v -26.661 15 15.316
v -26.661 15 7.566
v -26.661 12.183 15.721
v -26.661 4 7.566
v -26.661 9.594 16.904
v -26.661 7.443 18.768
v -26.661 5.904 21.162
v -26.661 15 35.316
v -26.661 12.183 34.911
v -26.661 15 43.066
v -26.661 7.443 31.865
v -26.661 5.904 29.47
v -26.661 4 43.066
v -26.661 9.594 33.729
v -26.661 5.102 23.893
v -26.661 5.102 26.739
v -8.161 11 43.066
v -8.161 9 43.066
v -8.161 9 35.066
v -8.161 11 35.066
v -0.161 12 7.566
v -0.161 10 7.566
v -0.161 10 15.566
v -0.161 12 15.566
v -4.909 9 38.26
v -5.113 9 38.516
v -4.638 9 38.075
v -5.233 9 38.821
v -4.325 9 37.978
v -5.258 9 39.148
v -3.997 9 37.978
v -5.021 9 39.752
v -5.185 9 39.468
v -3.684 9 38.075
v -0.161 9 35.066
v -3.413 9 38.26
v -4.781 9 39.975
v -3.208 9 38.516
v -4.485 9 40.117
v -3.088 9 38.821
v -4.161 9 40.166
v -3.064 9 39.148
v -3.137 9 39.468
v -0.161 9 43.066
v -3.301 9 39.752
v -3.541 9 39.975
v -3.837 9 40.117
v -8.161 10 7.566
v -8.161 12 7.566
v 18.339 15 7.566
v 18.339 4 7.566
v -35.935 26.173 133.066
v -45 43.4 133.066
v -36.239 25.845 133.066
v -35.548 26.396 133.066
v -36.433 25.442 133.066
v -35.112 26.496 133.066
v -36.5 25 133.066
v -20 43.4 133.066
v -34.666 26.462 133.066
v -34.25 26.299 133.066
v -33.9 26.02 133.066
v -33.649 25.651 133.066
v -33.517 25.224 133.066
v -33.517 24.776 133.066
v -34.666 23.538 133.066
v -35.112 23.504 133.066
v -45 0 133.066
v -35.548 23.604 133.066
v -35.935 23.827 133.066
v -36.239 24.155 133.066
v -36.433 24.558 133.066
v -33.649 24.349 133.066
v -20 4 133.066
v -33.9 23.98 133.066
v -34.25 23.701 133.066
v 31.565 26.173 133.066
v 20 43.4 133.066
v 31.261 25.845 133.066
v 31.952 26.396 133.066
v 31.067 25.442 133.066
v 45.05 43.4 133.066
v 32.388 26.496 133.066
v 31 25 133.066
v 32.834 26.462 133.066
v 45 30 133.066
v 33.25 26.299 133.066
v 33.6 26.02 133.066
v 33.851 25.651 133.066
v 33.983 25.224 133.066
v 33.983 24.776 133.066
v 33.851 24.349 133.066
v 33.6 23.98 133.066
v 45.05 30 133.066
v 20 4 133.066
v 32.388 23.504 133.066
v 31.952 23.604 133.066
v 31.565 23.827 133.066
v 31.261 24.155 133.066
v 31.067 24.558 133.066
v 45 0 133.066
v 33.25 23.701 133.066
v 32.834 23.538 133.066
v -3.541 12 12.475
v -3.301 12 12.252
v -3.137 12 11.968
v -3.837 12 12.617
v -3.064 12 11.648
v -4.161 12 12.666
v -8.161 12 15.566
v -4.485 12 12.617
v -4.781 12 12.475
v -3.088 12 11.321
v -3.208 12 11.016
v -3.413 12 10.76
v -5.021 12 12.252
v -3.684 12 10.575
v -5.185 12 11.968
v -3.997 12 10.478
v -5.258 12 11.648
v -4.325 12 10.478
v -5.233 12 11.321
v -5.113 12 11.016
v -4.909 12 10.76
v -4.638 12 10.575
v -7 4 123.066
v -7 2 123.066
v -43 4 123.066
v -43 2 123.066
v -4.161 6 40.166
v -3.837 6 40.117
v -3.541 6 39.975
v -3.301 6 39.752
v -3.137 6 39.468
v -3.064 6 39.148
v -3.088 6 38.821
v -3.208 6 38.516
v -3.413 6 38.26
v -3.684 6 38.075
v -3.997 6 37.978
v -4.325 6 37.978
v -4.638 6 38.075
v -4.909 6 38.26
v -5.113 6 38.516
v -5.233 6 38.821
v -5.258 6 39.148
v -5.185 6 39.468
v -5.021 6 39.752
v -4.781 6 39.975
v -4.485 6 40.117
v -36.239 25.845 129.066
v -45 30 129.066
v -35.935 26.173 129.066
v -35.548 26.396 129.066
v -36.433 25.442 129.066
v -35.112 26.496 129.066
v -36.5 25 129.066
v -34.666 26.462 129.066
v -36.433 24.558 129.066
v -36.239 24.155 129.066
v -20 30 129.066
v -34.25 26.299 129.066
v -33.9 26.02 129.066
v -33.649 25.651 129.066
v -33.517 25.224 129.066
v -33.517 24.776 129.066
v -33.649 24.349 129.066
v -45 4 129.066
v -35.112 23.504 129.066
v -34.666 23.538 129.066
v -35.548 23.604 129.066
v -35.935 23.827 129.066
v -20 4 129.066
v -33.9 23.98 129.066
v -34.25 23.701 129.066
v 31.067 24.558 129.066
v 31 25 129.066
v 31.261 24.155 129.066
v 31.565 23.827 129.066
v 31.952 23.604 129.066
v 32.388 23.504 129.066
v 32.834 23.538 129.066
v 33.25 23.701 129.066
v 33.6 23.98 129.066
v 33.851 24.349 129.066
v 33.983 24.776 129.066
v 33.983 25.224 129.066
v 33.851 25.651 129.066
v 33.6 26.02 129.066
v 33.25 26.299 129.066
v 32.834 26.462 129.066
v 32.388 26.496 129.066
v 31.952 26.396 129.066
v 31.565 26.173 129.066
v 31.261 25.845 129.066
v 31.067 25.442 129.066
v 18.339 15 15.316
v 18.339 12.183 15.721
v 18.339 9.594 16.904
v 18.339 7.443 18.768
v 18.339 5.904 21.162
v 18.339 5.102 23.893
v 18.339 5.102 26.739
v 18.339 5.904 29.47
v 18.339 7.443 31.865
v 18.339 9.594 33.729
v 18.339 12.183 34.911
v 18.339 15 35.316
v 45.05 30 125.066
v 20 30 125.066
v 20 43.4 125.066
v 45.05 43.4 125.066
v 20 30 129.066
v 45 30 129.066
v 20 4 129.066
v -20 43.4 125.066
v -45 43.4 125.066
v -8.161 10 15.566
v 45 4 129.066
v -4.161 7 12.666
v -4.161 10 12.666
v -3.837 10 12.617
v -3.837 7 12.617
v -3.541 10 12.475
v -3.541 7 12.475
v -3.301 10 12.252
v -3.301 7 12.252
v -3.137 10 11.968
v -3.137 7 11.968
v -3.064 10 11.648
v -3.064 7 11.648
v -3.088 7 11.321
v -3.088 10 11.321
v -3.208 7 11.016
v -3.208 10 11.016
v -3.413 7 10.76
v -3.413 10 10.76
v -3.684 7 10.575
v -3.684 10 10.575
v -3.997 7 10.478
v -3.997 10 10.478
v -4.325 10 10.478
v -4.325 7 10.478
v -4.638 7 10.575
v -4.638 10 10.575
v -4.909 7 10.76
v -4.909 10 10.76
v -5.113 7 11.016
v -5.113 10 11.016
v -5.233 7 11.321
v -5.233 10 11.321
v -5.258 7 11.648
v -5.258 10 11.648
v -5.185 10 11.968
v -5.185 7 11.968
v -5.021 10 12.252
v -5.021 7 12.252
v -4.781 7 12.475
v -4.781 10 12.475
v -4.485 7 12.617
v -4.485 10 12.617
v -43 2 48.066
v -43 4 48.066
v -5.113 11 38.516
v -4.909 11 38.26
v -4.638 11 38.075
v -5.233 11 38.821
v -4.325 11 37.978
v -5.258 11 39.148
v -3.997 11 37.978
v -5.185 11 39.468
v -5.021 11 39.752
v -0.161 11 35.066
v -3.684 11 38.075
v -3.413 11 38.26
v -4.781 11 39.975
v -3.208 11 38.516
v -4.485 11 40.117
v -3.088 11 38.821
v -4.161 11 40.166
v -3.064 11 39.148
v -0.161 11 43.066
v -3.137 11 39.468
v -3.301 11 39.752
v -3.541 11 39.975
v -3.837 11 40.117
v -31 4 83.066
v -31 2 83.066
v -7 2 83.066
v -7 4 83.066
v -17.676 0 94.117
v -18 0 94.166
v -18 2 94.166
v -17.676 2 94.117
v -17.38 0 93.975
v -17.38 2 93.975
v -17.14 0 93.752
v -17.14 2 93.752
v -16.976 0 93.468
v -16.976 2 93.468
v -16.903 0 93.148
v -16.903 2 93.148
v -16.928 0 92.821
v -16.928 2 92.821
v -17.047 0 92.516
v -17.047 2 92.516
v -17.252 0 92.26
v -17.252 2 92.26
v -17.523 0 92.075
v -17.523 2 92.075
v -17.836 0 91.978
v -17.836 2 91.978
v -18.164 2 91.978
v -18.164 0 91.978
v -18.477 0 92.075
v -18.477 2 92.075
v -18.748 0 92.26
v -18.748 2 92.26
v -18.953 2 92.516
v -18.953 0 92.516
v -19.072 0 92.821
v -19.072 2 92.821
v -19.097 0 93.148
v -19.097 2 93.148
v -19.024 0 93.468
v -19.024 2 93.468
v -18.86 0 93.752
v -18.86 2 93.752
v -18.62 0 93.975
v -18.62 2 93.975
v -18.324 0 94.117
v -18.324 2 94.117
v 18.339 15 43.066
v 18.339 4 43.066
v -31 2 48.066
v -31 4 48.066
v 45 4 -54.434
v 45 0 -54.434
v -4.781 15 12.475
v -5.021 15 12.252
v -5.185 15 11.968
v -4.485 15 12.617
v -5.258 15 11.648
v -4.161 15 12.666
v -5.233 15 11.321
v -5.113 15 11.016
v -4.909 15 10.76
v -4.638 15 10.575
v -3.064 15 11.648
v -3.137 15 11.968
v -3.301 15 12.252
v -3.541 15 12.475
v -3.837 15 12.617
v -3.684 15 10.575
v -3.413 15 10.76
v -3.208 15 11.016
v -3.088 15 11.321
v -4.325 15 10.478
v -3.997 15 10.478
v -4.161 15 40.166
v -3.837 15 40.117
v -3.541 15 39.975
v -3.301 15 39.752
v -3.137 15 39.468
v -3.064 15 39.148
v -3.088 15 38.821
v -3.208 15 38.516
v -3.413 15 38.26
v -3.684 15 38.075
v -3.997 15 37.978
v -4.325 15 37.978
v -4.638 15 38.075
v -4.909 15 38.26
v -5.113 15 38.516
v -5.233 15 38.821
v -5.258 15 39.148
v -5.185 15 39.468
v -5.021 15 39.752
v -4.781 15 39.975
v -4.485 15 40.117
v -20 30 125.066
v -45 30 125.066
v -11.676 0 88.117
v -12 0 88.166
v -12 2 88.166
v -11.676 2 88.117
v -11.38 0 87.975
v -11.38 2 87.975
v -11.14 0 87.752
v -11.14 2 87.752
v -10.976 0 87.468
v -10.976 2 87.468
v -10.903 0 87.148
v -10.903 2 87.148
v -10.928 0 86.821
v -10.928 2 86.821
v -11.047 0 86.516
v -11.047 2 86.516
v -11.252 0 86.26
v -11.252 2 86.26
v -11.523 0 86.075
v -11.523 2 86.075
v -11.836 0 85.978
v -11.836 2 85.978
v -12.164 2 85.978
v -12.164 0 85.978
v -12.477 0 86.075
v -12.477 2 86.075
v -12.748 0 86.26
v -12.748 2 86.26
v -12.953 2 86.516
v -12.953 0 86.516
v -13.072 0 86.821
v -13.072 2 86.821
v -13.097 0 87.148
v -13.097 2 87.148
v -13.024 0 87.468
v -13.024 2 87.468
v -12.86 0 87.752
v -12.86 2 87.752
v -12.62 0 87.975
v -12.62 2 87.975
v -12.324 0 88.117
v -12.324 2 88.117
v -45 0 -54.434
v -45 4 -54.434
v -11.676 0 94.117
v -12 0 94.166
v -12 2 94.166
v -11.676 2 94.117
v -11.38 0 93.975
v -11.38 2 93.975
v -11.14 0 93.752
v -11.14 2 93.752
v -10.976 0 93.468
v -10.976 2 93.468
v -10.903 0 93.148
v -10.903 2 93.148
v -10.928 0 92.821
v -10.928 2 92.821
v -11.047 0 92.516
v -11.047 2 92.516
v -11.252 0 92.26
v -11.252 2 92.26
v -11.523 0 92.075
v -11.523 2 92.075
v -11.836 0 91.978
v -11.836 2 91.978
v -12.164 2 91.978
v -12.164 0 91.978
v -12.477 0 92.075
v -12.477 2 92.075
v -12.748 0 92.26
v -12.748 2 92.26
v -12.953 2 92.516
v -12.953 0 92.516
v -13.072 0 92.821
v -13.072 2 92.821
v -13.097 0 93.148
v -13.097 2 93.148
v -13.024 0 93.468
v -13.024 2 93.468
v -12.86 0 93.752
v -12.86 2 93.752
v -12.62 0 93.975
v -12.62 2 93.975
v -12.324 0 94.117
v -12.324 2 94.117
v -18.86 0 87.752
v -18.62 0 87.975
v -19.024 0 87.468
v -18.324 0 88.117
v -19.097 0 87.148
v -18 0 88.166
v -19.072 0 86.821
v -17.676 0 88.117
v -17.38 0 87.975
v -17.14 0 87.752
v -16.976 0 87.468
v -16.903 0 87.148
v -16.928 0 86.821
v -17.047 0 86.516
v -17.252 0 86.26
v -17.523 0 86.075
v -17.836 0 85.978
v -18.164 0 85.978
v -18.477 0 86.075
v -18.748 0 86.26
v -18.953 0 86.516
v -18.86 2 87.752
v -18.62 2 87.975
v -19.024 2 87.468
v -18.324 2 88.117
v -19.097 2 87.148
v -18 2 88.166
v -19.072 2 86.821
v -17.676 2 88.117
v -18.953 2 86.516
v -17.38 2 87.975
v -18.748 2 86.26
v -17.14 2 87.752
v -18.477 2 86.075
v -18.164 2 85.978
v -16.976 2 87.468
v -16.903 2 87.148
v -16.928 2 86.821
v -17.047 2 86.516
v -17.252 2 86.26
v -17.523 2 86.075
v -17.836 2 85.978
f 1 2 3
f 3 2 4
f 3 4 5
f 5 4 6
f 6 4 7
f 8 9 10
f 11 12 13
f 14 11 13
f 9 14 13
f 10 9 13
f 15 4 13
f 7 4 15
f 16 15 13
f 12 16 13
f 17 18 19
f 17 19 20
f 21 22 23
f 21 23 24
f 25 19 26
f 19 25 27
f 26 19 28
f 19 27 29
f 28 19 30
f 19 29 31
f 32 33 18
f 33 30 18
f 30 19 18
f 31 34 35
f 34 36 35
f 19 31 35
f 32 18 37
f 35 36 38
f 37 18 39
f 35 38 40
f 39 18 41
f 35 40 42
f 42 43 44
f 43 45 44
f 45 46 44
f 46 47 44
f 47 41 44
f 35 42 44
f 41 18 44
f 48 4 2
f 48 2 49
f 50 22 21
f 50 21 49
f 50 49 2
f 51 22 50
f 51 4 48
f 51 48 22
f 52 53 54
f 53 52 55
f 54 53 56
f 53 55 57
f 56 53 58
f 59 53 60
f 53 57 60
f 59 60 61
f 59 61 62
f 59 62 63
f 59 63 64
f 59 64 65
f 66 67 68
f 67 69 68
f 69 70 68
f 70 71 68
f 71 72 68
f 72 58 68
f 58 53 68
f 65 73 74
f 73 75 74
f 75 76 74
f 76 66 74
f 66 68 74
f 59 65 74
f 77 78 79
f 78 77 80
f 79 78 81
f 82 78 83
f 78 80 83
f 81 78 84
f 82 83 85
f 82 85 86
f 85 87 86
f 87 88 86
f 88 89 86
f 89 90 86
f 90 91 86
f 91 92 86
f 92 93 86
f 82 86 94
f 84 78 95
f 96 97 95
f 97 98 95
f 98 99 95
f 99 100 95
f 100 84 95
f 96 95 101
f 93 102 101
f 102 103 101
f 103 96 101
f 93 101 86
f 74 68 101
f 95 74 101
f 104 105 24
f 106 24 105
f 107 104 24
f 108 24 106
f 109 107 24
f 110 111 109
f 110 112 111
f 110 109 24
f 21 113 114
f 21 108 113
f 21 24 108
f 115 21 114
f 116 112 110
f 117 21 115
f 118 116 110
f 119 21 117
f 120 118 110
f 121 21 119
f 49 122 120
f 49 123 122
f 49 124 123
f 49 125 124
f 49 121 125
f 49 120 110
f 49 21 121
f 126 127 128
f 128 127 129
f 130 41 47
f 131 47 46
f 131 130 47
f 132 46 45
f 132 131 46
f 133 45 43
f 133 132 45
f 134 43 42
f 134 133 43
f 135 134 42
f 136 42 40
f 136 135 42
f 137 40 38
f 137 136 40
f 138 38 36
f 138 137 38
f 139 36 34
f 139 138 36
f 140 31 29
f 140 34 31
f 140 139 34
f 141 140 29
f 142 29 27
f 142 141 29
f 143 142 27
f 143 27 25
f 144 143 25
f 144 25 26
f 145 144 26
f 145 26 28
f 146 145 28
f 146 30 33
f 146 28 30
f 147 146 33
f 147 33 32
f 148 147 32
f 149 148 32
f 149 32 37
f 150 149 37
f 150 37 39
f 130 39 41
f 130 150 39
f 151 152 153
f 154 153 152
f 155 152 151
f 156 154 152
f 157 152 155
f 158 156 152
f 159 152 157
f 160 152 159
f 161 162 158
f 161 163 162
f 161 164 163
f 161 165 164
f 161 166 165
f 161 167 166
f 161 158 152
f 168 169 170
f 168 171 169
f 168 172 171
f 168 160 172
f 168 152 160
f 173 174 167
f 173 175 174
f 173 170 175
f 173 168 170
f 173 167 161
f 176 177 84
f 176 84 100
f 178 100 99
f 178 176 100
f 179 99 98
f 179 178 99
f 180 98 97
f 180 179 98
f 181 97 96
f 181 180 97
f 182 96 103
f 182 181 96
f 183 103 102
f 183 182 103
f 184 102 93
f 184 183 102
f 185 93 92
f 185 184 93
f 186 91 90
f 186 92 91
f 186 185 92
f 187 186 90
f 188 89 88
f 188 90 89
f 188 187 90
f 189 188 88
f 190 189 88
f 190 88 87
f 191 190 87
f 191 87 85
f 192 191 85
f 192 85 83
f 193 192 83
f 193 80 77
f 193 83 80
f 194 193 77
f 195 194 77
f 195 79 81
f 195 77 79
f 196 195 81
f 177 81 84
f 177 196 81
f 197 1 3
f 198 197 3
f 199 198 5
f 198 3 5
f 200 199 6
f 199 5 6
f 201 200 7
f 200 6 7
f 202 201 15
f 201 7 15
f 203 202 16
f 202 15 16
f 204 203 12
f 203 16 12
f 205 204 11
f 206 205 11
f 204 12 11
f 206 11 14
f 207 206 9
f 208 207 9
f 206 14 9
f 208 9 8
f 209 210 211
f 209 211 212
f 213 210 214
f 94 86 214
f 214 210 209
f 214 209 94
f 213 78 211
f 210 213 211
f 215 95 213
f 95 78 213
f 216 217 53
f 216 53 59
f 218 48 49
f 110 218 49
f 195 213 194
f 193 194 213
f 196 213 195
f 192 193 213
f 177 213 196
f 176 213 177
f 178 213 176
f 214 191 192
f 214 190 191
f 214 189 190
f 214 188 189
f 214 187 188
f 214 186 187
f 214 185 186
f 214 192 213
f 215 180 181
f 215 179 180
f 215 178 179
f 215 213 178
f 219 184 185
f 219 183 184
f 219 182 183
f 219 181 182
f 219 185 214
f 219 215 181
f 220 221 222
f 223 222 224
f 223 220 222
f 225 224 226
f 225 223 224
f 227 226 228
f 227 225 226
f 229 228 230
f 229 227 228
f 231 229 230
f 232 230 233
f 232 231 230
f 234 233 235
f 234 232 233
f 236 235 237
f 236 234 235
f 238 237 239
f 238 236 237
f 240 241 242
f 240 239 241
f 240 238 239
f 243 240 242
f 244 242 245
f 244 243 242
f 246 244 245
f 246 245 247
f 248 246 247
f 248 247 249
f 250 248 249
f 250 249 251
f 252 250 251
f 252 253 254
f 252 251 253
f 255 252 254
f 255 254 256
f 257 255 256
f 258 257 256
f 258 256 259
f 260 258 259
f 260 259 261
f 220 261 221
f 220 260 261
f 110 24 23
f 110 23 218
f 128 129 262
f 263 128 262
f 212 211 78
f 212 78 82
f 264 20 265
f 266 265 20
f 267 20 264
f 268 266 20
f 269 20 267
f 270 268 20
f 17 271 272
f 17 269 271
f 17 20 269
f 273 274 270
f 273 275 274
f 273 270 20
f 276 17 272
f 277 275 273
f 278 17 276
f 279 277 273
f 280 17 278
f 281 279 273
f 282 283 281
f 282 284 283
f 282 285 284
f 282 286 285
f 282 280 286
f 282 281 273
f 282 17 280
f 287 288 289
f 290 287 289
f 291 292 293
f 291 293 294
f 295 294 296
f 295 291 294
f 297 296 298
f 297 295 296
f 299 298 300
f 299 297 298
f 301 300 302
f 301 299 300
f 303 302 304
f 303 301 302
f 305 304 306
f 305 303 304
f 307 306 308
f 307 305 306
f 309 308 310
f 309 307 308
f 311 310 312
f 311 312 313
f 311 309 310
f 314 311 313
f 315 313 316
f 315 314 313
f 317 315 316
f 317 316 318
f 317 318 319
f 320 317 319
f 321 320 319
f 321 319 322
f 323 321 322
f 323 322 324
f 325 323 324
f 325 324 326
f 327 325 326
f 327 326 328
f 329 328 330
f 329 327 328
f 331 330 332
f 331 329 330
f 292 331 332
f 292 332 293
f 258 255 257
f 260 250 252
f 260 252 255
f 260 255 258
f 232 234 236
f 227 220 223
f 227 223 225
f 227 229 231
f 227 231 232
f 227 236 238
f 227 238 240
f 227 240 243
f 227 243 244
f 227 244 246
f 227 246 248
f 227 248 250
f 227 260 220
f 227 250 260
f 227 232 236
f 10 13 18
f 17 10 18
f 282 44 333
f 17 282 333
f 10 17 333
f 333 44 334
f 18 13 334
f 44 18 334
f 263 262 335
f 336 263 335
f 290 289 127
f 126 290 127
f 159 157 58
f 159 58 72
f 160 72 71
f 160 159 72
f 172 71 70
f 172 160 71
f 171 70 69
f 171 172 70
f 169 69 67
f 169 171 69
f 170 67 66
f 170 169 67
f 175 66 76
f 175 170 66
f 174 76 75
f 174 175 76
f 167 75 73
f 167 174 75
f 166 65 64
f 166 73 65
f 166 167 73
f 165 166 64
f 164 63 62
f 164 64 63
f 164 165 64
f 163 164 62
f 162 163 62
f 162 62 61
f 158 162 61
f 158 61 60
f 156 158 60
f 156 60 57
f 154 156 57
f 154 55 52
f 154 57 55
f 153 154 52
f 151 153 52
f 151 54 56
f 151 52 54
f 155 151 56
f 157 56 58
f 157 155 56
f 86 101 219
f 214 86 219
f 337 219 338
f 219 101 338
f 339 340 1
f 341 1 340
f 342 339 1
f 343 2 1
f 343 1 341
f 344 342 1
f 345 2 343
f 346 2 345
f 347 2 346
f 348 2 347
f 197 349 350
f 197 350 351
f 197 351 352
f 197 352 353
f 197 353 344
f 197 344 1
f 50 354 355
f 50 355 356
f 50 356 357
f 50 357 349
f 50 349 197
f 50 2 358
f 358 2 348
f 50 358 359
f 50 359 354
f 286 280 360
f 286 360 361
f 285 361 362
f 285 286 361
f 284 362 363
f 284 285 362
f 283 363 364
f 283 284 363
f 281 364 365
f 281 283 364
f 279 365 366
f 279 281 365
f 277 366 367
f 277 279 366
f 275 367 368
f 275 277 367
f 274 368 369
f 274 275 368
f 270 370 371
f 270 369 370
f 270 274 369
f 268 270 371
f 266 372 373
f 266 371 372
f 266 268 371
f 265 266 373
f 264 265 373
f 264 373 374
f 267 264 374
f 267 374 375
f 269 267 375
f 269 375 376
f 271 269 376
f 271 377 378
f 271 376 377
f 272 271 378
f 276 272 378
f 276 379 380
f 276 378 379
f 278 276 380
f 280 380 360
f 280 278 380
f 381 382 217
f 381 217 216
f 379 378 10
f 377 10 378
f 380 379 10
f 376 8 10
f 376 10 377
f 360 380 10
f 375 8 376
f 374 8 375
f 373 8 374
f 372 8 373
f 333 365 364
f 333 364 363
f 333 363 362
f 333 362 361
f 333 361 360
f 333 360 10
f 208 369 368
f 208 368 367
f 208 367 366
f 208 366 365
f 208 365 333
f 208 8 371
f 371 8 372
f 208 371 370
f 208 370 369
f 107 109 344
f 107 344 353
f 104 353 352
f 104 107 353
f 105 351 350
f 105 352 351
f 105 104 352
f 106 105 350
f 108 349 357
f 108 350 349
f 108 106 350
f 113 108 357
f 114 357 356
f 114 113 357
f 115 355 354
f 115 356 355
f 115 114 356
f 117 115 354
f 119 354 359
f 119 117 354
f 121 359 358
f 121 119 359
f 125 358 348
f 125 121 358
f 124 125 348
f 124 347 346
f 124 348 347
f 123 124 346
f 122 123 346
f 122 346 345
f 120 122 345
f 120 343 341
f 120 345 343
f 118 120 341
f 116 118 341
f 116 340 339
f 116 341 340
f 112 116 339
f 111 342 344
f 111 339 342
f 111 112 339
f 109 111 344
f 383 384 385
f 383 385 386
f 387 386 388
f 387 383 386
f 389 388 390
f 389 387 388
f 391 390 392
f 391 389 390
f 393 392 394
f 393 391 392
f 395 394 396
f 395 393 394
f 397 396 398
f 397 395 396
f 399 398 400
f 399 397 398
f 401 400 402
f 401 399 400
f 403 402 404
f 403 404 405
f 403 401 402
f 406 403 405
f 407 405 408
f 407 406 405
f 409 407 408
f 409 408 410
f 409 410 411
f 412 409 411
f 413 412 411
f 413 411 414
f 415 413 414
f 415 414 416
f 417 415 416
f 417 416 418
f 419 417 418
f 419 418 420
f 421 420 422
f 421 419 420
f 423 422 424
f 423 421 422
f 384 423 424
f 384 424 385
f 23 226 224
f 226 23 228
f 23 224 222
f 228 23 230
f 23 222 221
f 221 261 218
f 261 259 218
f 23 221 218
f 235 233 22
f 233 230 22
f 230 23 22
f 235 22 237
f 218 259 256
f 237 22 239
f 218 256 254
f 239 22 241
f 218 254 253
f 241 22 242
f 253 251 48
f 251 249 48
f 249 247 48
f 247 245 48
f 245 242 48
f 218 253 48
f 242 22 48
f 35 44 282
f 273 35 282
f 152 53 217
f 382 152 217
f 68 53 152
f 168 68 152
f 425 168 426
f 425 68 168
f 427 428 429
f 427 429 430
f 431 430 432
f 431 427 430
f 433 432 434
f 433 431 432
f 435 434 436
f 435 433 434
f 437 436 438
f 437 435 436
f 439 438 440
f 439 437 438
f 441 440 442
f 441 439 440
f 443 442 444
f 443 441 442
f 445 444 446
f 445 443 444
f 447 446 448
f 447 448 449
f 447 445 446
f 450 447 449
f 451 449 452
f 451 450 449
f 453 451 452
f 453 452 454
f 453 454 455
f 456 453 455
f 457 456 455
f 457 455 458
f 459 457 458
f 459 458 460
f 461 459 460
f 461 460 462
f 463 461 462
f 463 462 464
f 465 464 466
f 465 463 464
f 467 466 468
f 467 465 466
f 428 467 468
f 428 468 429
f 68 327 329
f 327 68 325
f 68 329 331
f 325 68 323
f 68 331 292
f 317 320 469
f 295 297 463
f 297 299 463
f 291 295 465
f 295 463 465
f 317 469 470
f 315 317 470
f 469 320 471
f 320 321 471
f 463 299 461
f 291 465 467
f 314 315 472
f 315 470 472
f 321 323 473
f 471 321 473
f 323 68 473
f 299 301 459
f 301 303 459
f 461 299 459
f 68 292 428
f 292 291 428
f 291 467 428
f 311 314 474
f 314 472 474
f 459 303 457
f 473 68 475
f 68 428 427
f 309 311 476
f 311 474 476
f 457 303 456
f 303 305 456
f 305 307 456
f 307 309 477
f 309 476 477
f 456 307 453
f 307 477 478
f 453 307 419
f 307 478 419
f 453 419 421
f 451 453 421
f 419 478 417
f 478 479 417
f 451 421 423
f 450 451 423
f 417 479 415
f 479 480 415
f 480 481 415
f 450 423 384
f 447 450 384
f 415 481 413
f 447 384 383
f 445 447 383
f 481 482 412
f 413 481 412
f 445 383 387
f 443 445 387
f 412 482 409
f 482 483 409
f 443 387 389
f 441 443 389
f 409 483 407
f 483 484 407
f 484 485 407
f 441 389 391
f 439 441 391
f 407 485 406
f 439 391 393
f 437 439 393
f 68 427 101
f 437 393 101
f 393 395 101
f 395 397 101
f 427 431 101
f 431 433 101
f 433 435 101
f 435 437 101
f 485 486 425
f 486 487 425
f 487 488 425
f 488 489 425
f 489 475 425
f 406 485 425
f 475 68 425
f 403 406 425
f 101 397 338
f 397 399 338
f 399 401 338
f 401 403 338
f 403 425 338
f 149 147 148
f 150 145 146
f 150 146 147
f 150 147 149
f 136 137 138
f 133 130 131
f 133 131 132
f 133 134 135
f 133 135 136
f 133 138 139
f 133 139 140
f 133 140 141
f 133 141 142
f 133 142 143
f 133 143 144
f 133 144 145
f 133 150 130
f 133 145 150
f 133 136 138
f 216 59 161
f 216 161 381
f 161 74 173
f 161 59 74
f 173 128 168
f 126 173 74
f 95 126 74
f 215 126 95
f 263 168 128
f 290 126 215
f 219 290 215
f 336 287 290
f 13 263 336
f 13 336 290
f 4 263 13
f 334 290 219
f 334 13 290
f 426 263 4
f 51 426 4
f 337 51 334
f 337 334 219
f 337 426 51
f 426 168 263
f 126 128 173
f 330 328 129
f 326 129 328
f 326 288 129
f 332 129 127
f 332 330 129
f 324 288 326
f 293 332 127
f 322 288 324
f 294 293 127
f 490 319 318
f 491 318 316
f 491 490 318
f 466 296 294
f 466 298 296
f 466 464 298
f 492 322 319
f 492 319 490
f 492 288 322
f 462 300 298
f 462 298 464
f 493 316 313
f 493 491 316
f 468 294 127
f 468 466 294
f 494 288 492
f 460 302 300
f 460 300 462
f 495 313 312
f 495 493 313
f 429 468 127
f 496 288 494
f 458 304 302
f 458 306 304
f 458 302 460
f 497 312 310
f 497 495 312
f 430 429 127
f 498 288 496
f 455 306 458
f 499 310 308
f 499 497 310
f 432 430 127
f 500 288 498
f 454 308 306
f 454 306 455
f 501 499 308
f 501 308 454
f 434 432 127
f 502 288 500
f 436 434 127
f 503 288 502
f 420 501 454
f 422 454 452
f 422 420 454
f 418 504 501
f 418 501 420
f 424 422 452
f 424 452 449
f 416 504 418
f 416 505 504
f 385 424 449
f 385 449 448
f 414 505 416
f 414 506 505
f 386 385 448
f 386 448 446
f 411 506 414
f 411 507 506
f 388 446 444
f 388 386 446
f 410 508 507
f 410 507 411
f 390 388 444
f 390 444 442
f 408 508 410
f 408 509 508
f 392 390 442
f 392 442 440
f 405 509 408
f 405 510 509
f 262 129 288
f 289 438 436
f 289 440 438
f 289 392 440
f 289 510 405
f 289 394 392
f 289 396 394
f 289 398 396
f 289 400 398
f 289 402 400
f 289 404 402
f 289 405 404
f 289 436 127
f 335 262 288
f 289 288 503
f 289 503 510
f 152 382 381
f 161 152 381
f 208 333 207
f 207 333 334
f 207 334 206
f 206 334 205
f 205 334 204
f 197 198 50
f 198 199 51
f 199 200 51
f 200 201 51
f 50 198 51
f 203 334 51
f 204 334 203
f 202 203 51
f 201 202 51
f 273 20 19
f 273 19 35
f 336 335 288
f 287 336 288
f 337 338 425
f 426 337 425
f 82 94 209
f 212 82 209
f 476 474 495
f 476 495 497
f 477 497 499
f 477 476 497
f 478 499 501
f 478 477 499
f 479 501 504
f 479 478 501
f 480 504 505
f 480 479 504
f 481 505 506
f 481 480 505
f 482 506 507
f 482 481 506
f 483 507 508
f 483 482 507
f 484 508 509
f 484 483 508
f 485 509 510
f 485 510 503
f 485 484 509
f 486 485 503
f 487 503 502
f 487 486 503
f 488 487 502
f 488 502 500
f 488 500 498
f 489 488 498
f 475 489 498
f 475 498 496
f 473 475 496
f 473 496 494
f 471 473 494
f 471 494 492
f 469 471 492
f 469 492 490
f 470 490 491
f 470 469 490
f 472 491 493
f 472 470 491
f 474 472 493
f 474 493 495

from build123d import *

# Parameters (mm, degrees)
SUPERFICIE_DEITADA_W     = 45
SUPERFICIE_DEITADA_H     = 35.5
BOSS_EXTRUDE1_DEPTH      = 4
SUPERFICIE_DEITADA_4_W   = 45
SUPERFICIE_DEITADA_4_H   = 8
SUPERFICIE_DEITADA_4_H_2 = 19.5
BOSS_EXTRUDE2_DEPTH      = 15
SUPERFICIE_DEITADA_5_W   = 12
SUPERFICIE_DEITADA_5_H   = 35
SUPERFICIE_DEITADA_5_W_2 = 24
SUPERFICIE_DEITADA_5_H_2 = 40
SUPERFICIE_DEITADA_5_R   = 1.1
BOSS_EXTRUDE3_DEPTH      = 2
SUPERFICIE_DEITADA_6_W   = 25
SUPERFICIE_DEITADA_6_H   = 4
BOSS_EXTRUDE4_DEPTH      = 30
SUPERFICIE_DEITADA_7_W   = 25
SUPERFICIE_DEITADA_7_H   = 4
BOSS_EXTRUDE5_DEPTH      = 30
SUPERFICIE_VERTICAL_R    = 1.5
CUT_EXTRUDE1_DEPTH       = 200.4
CUT_EXTRUDE2_DEPTH       = 200.4
SKETCH5_W                = 8
SKETCH5_H                = 2
CUT_EXTRUDE3_DEPTH       = 8
CUT_EXTRUDE4_DEPTH       = 7
CUT_EXTRUDE4_DEPTH_BACK  = 3
SKETCH6_R                = 1.1
SKETCH8_W                = 8
SKETCH8_H                = 2
CUT_EXTRUDE5_DEPTH       = 8
CUT_EXTRUDE6_DEPTH       = 15
CUT_EXTRUDE6_DEPTH_BACK  = 3
SKETCH9_R                = 1.1
SKETCH11_W               = 25.05
SKETCH11_H               = 8
BOSS_EXTRUDE6_DEPTH      = 13.4
SKETCH12_W               = 25
SKETCH12_H               = 8
BOSS_EXTRUDE7_DEPTH      = 13.4


with BuildPart() as part:
    # Superficie_Deitada → Boss-Extrude1 (new body)
    with BuildSketch(Plane(origin=(0, 0, 0), x_dir=(1, 0, 0), z_dir=(0, 1, 0))):
        Polygon((-20, -129.066204139), (-20, -133.066204139), (20, -133.066204139), (20, -129.066204139), (45, -129.066204139), (45, 54.433795861), (-45, 54.433795861), (-45, -129.066204139), align=None)
        with Locations((-4.160854438, -25.316204139)):
            Rectangle(SUPERFICIE_DEITADA_W, SUPERFICIE_DEITADA_H, mode=Mode.SUBTRACT)
        Polygon((-43, -48.066204139), (-31, -48.066204139), (-31, -83.066204139), (-7, -83.066204139), (-7, -123.066204139), (-43, -123.066204139), align=None, mode=Mode.SUBTRACT)
    extrude(amount=BOSS_EXTRUDE1_DEPTH)

    # Superficie_Deitada<4> → Boss-Extrude2 (add)
    with BuildSketch(Plane(origin=(0, 0, 0), x_dir=(1, 0, 0), z_dir=(0, 1, 0))):
        with Locations((-4.160854438, -11.566204139)):
            Rectangle(SUPERFICIE_DEITADA_4_W, SUPERFICIE_DEITADA_4_H)
        with Locations((-4.160854438, -25.316204139)):
            Rectangle(SUPERFICIE_DEITADA_4_W, SUPERFICIE_DEITADA_4_H_2)
        with Locations((-4.160854438, -39.066204139)):
            Rectangle(SUPERFICIE_DEITADA_4_W, SUPERFICIE_DEITADA_4_H)
    extrude(amount=BOSS_EXTRUDE2_DEPTH)

    # Superficie_Deitada<5> → Boss-Extrude3 (add)
    # profile 1 of 3: a face of its own
    with BuildSketch(Plane(origin=(0, 0, 0), x_dir=(1, 0, 0), z_dir=(0, 1, 0))):
        with Locations((-37, -65.566204139)):
            Rectangle(SUPERFICIE_DEITADA_5_W, SUPERFICIE_DEITADA_5_H)
    # profile 2 of 3: a face of its own
    with BuildSketch(Plane(origin=(0, 0, 0), x_dir=(1, 0, 0), z_dir=(0, 1, 0))):
        with Locations((-19, -103.066204139)):
            Rectangle(SUPERFICIE_DEITADA_5_W_2, SUPERFICIE_DEITADA_5_H_2)
        with Locations(Location((-18, -93.066204139, 0), (0, 0, 270))):
            Circle(SUPERFICIE_DEITADA_5_R, mode=Mode.SUBTRACT)
        with Locations(Location((-18, -87.066204139, 0), (0, 0, 270))):
            Circle(SUPERFICIE_DEITADA_5_R, mode=Mode.SUBTRACT)
        with Locations(Location((-12, -93.066204139, 0), (0, 0, 270))):
            Circle(SUPERFICIE_DEITADA_5_R, mode=Mode.SUBTRACT)
        with Locations(Location((-12, -87.066204139, 0), (0, 0, 270))):
            Circle(SUPERFICIE_DEITADA_5_R, mode=Mode.SUBTRACT)
    # profile 3 of 3: a face of its own
    with BuildSketch(Plane(origin=(0, 0, 0), x_dir=(1, 0, 0), z_dir=(0, 1, 0))):
        with Locations((-37, -103.066204139)):
            Rectangle(SUPERFICIE_DEITADA_5_W, SUPERFICIE_DEITADA_5_H_2)
    extrude(amount=BOSS_EXTRUDE3_DEPTH)

    # Superficie_Deitada<6> → Boss-Extrude4 (add)
    with BuildSketch(Plane(origin=(0, 0, 0), x_dir=(1, 0, 0), z_dir=(0, 1, 0))):
        with Locations((32.5, -131.066204139)):
            Rectangle(SUPERFICIE_DEITADA_6_W, SUPERFICIE_DEITADA_6_H)
    extrude(amount=BOSS_EXTRUDE4_DEPTH)

    # Superficie_Deitada<7> → Boss-Extrude5 (add)
    with BuildSketch(Plane(origin=(0, 0, 0), x_dir=(1, 0, 0), z_dir=(0, 1, 0))):
        with Locations((-32.5, -131.066204139)):
            Rectangle(SUPERFICIE_DEITADA_7_W, SUPERFICIE_DEITADA_7_H)
    extrude(amount=BOSS_EXTRUDE5_DEPTH)

    # Superficie_vertical → Cut-Extrude1 (cut)
    with BuildSketch(Plane.XY):
        with Locations(Location((32.5, 25, 0), (0, 0, 180))):
            Circle(SUPERFICIE_VERTICAL_R)
        with Locations(Location((-35, 25, 0), (0, 0, 180))):
            Circle(SUPERFICIE_VERTICAL_R)
    extrude(amount=CUT_EXTRUDE1_DEPTH, mode=Mode.SUBTRACT)

    # Sketch4 → Cut-Extrude2 (cut)
    with BuildSketch(Plane.ZY.offset(26.660854438)):
        with BuildLine():
            ThreePointArc((35.316204139, 15), (25.316204139, 25), (15.316204139, 15))
            Line((15.316204139, 15), (15.566204139, 15))
            Line((15.566204139, 15), (35.066204139, 15))
            Line((35.066204139, 15), (35.316204139, 15))
        make_face()
        with BuildLine():
            Line((15.566204139, 15), (15.316204139, 15))
            ThreePointArc((15.316204139, 15), (25.316204139, 5), (35.316204139, 15))
            Line((35.316204139, 15), (35.066204139, 15))
            Line((35.066204139, 15), (15.566204139, 15))
        make_face()
    extrude(amount=-CUT_EXTRUDE2_DEPTH, mode=Mode.SUBTRACT)

    # Sketch5 → Cut-Extrude3 (cut)
    with BuildSketch(Plane(origin=(0, 0, 7.566204139), x_dir=(-1, 0, 0), z_dir=(0, 0, -1))):
        with Locations((4.160854438, 11)):
            Rectangle(SKETCH5_W, SKETCH5_H)
    extrude(amount=-CUT_EXTRUDE3_DEPTH, mode=Mode.SUBTRACT)

    # Sketch6 → Cut-Extrude4 (cut, two sides: drawn at the far end of the back side and taken through both)
    with BuildSketch(Plane(origin=(0, 10, 0), x_dir=(1, 0, 0), z_dir=(0, 1, 0)).offset(-CUT_EXTRUDE4_DEPTH_BACK)):
        with Locations(Location((-4.160854438, -11.566204139, 0), (0, 0, 270))):
            Circle(SKETCH6_R)
    extrude(amount=CUT_EXTRUDE4_DEPTH + CUT_EXTRUDE4_DEPTH_BACK, mode=Mode.SUBTRACT)

    # Sketch8 → Cut-Extrude5 (cut)
    with BuildSketch(Plane.XY.offset(43.066204139)):
        with Locations((-4.160854438, 10)):
            Rectangle(SKETCH8_W, SKETCH8_H)
    extrude(amount=-CUT_EXTRUDE5_DEPTH, mode=Mode.SUBTRACT)

    # Sketch9 → Cut-Extrude6 (cut, two sides: drawn at the far end of the back side and taken through both)
    with BuildSketch(Plane(origin=(0, 9, 0), x_dir=(1, 0, 0), z_dir=(0, 1, 0)).offset(-CUT_EXTRUDE6_DEPTH_BACK)):
        with Locations(Location((-4.160854438, -39.066204139, 0), (0, 0, 270))):
            Circle(SKETCH9_R)
    extrude(amount=CUT_EXTRUDE6_DEPTH + CUT_EXTRUDE6_DEPTH_BACK, mode=Mode.SUBTRACT)

    # Sketch11 → Boss-Extrude6 (add)
    with BuildSketch(Plane(origin=(0, 30, 0), x_dir=(1, 0, 0), z_dir=(0, 1, 0))):
        with Locations((32.525, -129.066204139)):
            Rectangle(SKETCH11_W, SKETCH11_H)
    extrude(amount=BOSS_EXTRUDE6_DEPTH)

    # Sketch12 → Boss-Extrude7 (add)
    with BuildSketch(Plane(origin=(0, 30, 0), x_dir=(1, 0, 0), z_dir=(0, 1, 0))):
        with Locations((-32.5, -129.066204139)):
            Rectangle(SKETCH12_W, SKETCH12_H)
    extrude(amount=BOSS_EXTRUDE7_DEPTH)


solid = part.part
